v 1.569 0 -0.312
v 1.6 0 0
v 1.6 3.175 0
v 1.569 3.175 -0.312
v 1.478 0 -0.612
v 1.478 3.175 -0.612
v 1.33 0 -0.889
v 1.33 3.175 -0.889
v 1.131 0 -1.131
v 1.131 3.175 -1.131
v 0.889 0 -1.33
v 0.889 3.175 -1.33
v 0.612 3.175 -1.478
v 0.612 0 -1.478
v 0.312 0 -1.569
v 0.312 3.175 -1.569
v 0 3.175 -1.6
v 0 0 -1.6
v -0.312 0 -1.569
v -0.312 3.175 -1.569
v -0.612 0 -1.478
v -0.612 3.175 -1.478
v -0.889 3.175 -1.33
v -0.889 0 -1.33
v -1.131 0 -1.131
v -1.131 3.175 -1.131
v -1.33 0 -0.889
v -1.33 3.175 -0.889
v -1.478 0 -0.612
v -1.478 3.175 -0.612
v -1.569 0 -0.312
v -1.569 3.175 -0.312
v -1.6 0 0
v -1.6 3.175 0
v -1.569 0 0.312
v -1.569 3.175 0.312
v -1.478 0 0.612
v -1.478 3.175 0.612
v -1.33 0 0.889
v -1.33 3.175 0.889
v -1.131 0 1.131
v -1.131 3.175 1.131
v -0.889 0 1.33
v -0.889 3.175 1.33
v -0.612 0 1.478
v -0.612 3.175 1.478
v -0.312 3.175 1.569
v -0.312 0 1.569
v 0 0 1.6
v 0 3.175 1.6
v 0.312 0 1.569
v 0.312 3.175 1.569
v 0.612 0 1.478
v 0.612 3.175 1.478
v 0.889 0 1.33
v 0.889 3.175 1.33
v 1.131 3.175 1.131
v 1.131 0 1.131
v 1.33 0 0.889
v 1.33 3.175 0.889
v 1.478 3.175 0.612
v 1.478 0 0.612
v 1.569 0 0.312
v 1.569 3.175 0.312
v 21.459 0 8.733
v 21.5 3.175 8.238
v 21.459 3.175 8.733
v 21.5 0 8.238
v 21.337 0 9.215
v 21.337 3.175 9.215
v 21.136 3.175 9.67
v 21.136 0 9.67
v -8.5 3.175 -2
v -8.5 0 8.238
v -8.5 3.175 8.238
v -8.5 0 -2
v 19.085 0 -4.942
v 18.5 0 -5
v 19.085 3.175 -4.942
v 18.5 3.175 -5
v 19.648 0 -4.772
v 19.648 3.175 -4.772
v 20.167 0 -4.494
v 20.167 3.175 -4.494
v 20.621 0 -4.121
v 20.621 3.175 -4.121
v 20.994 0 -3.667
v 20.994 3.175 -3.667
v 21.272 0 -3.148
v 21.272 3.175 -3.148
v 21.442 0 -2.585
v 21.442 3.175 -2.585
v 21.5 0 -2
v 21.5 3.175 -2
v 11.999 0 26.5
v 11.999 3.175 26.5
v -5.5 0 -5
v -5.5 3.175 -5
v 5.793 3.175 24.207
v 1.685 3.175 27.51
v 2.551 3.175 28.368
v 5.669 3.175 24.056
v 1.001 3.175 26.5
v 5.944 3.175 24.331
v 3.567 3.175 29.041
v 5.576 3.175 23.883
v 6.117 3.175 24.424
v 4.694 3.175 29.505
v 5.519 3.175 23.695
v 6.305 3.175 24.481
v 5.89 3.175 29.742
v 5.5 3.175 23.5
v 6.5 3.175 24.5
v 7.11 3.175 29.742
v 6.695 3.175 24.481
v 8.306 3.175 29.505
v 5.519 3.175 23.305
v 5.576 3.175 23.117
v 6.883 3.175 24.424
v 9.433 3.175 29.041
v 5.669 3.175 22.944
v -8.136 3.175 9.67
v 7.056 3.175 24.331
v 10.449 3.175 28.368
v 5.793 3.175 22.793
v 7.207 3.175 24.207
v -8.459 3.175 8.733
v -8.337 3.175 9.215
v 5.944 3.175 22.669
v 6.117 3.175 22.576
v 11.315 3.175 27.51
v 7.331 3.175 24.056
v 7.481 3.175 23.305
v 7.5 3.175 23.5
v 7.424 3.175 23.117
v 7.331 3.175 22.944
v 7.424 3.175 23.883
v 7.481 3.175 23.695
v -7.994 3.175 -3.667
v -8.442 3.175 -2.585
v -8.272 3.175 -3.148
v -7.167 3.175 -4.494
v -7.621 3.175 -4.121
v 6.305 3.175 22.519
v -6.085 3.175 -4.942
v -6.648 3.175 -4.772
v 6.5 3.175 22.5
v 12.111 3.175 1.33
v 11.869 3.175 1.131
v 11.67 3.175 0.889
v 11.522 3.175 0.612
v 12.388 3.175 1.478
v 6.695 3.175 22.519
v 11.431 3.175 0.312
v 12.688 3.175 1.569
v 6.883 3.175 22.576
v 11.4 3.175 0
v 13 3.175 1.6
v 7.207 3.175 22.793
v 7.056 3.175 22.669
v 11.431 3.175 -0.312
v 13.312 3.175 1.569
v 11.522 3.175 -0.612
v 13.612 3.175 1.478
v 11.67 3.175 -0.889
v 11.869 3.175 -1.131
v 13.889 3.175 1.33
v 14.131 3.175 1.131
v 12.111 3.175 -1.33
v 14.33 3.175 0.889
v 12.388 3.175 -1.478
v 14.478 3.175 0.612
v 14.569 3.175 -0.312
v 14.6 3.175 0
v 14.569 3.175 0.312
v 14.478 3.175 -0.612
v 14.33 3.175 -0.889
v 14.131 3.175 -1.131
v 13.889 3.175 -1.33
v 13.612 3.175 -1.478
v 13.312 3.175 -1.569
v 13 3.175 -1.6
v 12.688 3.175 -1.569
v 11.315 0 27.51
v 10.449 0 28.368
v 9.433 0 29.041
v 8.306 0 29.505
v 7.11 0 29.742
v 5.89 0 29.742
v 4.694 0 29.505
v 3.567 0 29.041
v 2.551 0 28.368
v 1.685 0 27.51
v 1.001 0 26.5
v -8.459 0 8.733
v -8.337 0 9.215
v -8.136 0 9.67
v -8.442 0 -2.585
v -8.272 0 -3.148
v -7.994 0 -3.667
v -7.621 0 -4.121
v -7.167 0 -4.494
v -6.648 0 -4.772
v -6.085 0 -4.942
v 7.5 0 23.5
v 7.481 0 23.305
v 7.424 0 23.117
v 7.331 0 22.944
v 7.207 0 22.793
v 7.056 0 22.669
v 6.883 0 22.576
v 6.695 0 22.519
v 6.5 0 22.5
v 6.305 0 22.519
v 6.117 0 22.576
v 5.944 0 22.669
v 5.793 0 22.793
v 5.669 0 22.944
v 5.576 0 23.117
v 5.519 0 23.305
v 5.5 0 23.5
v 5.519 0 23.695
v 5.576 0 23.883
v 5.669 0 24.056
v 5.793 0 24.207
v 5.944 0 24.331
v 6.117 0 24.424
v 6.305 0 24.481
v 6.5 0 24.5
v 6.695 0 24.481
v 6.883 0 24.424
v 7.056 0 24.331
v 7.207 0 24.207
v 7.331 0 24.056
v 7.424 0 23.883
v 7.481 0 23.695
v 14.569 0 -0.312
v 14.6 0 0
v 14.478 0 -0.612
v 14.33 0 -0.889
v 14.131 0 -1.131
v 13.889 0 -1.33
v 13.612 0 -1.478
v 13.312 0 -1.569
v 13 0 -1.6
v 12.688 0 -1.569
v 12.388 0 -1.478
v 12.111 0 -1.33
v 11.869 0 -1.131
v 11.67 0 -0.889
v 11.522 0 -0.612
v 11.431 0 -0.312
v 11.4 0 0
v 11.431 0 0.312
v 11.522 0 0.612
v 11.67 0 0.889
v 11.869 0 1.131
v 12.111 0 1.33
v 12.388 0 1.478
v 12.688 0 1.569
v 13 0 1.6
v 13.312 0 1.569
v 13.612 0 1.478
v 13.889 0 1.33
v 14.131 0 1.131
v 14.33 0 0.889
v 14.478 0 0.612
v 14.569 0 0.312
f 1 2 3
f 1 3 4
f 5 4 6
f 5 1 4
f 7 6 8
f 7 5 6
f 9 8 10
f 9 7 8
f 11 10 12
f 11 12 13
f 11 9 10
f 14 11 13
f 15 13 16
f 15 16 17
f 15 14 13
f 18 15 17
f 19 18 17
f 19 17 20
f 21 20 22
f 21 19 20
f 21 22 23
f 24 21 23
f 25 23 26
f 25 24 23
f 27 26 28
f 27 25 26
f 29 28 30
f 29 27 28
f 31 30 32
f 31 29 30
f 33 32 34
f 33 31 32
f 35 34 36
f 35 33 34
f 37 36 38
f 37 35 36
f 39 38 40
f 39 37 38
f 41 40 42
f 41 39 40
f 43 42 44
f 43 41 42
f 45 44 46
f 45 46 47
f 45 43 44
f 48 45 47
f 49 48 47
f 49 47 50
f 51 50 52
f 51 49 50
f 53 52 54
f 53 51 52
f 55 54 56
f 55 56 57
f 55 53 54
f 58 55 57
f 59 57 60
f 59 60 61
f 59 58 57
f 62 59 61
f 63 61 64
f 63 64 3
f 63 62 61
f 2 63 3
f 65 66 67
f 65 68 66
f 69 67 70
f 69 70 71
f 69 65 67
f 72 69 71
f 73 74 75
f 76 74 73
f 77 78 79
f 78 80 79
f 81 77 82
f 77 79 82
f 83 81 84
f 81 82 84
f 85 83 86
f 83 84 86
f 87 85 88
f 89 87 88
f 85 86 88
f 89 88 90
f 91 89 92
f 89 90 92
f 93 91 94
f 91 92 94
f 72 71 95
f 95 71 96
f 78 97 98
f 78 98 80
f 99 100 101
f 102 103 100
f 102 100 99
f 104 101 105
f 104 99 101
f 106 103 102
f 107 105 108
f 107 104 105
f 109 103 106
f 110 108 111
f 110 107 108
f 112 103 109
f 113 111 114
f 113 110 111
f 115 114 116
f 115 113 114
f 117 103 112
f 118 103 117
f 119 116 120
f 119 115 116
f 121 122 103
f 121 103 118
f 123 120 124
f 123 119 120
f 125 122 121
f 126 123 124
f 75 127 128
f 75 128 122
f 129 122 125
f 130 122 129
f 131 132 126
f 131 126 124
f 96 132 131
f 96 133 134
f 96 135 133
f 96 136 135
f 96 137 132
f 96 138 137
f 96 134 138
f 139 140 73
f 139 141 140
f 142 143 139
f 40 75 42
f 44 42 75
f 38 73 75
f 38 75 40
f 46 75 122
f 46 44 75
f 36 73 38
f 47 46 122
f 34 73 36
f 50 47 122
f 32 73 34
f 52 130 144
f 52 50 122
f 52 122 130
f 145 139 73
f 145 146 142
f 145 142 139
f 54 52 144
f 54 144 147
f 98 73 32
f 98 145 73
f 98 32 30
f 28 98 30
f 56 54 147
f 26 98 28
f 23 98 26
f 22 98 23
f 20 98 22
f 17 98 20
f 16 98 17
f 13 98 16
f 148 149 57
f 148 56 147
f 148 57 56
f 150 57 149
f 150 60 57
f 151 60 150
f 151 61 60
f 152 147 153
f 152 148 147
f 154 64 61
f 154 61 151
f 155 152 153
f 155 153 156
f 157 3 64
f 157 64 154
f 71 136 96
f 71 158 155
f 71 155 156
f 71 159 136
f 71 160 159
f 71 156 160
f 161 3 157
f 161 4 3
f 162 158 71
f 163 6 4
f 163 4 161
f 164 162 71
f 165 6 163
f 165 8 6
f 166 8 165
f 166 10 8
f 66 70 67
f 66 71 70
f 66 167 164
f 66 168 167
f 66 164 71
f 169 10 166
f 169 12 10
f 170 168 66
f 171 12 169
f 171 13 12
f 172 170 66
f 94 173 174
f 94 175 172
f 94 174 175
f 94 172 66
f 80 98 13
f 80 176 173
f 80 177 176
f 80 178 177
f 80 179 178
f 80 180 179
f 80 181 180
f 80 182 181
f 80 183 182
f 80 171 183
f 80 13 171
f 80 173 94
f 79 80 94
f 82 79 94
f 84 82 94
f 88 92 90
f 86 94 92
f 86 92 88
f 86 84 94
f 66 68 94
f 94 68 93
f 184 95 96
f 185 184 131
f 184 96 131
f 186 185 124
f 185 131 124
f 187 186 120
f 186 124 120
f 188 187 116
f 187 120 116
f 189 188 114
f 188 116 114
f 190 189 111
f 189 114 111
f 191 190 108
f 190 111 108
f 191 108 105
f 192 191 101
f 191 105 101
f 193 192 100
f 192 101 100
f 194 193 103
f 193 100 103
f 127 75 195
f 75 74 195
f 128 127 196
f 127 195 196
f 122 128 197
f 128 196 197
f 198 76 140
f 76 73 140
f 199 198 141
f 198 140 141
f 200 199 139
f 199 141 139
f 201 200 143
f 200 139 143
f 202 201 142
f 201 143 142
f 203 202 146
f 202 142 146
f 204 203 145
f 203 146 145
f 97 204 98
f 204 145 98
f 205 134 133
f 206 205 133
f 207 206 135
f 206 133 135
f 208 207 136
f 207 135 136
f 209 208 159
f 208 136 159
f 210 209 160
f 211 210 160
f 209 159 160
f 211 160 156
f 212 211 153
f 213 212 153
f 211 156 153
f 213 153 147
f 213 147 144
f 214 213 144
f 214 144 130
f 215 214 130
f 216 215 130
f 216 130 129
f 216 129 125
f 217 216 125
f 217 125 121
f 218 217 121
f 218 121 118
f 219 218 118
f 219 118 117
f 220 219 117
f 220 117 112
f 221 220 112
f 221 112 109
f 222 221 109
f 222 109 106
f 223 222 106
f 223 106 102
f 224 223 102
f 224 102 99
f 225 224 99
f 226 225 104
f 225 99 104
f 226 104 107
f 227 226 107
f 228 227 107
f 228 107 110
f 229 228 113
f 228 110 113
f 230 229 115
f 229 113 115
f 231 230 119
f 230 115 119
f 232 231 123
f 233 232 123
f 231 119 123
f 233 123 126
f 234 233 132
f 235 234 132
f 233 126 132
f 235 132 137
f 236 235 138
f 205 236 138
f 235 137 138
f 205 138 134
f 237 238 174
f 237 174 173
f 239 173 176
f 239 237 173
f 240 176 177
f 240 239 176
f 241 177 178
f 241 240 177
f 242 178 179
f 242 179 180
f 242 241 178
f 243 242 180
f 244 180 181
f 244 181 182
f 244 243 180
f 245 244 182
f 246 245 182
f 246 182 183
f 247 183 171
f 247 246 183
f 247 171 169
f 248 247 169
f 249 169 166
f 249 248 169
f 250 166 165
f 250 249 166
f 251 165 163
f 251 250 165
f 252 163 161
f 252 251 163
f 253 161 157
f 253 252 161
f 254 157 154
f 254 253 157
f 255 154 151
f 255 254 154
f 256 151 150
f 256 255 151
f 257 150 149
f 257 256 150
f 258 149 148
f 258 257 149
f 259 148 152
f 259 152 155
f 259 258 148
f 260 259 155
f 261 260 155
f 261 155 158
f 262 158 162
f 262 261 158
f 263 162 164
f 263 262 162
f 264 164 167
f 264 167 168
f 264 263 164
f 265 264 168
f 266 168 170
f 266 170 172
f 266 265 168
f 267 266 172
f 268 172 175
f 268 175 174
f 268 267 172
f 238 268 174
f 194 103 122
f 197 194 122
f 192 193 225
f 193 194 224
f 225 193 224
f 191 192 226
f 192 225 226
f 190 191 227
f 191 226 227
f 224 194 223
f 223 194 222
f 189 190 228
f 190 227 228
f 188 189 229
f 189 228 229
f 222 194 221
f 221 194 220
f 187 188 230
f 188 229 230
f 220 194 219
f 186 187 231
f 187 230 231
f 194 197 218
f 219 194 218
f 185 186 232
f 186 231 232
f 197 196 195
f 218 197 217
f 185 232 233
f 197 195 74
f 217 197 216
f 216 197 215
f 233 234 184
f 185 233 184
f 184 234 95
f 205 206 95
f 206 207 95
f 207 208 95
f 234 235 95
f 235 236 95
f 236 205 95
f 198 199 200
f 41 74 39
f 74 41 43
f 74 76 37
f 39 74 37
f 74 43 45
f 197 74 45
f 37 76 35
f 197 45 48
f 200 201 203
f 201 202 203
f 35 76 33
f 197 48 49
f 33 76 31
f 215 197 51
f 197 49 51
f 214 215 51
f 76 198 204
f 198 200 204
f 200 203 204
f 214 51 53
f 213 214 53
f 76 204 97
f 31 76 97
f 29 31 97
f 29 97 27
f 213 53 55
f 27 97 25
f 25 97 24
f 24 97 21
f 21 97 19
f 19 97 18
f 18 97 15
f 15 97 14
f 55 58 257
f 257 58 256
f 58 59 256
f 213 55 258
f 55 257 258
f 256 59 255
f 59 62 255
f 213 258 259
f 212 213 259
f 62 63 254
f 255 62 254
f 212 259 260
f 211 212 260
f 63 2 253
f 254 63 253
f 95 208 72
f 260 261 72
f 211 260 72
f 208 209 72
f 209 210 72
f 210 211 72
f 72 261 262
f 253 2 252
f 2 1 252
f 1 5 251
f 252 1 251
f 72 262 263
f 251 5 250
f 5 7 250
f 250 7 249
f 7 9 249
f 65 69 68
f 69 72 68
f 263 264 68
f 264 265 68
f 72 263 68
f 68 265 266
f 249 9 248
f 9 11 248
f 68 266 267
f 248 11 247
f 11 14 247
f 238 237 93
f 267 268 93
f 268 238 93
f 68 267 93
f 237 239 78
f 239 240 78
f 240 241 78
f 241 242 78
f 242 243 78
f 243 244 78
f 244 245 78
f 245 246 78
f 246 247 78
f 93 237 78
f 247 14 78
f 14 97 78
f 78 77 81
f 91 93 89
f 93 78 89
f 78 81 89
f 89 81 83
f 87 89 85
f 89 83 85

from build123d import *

# Parameters (mm, degrees)
SKETCH1_W           = 30
SKETCH1_H           = 35
SKETCH1_R           = 1.6
BOSS_EXTRUDE1_DEPTH = 3.175
CUT_EXTRUDE1_REACH  = 5.175
SKETCH2_R           = 1
CUT_EXTRUDE2_DEPTH  = 4.175
FILLET1_R           = 3


with BuildPart() as part:
    # Sketch1 → Boss-Extrude1 (new body)
    with BuildSketch(Plane(origin=(0, 0, 0), x_dir=(1, 0, 0), z_dir=(0, 1, 0))):
        with Locations((6.5, -12.5)):
            Rectangle(SKETCH1_W, SKETCH1_H)
        Circle(SKETCH1_R, mode=Mode.SUBTRACT)
        with Locations((13, 0)):
            Circle(SKETCH1_R, mode=Mode.SUBTRACT)
    extrude(amount=BOSS_EXTRUDE1_DEPTH)

    # Sketch2 → Cut-Extrude1 (cut, up to next)
    with BuildSketch(Plane(origin=(0, 3.175, 0), x_dir=(1, 0, 0), z_dir=(0, 1, 0)), mode=Mode.PRIVATE) as cut_extrude1_sk1:
        with Locations((6.5, -23.5)):
            Circle(SKETCH2_R)
    cut_extrude1_tool1 = extrude(cut_extrude1_sk1.sketch, amount=-CUT_EXTRUDE1_REACH, mode=Mode.PRIVATE) & part.part
    add(cut_extrude1_tool1.solids().sort_by_distance((6.5, 3.175, 23.5))[0], mode=Mode.SUBTRACT)

    # Sketch3 → Cut-Extrude2 (cut, through all)
    with BuildSketch(Plane(origin=(0, 3.175, 0), x_dir=(1, 0, 0), z_dir=(0, 1, 0))):
        with BuildLine():
            Line((21.5, -9), (11.998845434, -26.5))
            ThreePointArc((11.998845434, -26.5), (6.5, -29.771562929), (1.001154566, -26.5))
            Line((1.001154566, -26.5), (-8.5, -9))
            Line((-8.5, -9), (-8.5, -30))
            Line((-8.5, -30), (21.5, -30))
            Line((21.5, -30), (21.5, -9))
        make_face()
    extrude(amount=-CUT_EXTRUDE2_DEPTH, mode=Mode.SUBTRACT)

    # Fillet1
    fillet1_edges = [part.edges().sort_by_distance(p)[0] for p in [
        (21.5, 1.5875, 9),
        (-8.5, 1.5875, 9),
        (-8.5, 1.5875, -5),
        (21.5, 1.5875, -5),
    ]]
    fillet(fillet1_edges, radius=FILLET1_R)


solid = part.part
